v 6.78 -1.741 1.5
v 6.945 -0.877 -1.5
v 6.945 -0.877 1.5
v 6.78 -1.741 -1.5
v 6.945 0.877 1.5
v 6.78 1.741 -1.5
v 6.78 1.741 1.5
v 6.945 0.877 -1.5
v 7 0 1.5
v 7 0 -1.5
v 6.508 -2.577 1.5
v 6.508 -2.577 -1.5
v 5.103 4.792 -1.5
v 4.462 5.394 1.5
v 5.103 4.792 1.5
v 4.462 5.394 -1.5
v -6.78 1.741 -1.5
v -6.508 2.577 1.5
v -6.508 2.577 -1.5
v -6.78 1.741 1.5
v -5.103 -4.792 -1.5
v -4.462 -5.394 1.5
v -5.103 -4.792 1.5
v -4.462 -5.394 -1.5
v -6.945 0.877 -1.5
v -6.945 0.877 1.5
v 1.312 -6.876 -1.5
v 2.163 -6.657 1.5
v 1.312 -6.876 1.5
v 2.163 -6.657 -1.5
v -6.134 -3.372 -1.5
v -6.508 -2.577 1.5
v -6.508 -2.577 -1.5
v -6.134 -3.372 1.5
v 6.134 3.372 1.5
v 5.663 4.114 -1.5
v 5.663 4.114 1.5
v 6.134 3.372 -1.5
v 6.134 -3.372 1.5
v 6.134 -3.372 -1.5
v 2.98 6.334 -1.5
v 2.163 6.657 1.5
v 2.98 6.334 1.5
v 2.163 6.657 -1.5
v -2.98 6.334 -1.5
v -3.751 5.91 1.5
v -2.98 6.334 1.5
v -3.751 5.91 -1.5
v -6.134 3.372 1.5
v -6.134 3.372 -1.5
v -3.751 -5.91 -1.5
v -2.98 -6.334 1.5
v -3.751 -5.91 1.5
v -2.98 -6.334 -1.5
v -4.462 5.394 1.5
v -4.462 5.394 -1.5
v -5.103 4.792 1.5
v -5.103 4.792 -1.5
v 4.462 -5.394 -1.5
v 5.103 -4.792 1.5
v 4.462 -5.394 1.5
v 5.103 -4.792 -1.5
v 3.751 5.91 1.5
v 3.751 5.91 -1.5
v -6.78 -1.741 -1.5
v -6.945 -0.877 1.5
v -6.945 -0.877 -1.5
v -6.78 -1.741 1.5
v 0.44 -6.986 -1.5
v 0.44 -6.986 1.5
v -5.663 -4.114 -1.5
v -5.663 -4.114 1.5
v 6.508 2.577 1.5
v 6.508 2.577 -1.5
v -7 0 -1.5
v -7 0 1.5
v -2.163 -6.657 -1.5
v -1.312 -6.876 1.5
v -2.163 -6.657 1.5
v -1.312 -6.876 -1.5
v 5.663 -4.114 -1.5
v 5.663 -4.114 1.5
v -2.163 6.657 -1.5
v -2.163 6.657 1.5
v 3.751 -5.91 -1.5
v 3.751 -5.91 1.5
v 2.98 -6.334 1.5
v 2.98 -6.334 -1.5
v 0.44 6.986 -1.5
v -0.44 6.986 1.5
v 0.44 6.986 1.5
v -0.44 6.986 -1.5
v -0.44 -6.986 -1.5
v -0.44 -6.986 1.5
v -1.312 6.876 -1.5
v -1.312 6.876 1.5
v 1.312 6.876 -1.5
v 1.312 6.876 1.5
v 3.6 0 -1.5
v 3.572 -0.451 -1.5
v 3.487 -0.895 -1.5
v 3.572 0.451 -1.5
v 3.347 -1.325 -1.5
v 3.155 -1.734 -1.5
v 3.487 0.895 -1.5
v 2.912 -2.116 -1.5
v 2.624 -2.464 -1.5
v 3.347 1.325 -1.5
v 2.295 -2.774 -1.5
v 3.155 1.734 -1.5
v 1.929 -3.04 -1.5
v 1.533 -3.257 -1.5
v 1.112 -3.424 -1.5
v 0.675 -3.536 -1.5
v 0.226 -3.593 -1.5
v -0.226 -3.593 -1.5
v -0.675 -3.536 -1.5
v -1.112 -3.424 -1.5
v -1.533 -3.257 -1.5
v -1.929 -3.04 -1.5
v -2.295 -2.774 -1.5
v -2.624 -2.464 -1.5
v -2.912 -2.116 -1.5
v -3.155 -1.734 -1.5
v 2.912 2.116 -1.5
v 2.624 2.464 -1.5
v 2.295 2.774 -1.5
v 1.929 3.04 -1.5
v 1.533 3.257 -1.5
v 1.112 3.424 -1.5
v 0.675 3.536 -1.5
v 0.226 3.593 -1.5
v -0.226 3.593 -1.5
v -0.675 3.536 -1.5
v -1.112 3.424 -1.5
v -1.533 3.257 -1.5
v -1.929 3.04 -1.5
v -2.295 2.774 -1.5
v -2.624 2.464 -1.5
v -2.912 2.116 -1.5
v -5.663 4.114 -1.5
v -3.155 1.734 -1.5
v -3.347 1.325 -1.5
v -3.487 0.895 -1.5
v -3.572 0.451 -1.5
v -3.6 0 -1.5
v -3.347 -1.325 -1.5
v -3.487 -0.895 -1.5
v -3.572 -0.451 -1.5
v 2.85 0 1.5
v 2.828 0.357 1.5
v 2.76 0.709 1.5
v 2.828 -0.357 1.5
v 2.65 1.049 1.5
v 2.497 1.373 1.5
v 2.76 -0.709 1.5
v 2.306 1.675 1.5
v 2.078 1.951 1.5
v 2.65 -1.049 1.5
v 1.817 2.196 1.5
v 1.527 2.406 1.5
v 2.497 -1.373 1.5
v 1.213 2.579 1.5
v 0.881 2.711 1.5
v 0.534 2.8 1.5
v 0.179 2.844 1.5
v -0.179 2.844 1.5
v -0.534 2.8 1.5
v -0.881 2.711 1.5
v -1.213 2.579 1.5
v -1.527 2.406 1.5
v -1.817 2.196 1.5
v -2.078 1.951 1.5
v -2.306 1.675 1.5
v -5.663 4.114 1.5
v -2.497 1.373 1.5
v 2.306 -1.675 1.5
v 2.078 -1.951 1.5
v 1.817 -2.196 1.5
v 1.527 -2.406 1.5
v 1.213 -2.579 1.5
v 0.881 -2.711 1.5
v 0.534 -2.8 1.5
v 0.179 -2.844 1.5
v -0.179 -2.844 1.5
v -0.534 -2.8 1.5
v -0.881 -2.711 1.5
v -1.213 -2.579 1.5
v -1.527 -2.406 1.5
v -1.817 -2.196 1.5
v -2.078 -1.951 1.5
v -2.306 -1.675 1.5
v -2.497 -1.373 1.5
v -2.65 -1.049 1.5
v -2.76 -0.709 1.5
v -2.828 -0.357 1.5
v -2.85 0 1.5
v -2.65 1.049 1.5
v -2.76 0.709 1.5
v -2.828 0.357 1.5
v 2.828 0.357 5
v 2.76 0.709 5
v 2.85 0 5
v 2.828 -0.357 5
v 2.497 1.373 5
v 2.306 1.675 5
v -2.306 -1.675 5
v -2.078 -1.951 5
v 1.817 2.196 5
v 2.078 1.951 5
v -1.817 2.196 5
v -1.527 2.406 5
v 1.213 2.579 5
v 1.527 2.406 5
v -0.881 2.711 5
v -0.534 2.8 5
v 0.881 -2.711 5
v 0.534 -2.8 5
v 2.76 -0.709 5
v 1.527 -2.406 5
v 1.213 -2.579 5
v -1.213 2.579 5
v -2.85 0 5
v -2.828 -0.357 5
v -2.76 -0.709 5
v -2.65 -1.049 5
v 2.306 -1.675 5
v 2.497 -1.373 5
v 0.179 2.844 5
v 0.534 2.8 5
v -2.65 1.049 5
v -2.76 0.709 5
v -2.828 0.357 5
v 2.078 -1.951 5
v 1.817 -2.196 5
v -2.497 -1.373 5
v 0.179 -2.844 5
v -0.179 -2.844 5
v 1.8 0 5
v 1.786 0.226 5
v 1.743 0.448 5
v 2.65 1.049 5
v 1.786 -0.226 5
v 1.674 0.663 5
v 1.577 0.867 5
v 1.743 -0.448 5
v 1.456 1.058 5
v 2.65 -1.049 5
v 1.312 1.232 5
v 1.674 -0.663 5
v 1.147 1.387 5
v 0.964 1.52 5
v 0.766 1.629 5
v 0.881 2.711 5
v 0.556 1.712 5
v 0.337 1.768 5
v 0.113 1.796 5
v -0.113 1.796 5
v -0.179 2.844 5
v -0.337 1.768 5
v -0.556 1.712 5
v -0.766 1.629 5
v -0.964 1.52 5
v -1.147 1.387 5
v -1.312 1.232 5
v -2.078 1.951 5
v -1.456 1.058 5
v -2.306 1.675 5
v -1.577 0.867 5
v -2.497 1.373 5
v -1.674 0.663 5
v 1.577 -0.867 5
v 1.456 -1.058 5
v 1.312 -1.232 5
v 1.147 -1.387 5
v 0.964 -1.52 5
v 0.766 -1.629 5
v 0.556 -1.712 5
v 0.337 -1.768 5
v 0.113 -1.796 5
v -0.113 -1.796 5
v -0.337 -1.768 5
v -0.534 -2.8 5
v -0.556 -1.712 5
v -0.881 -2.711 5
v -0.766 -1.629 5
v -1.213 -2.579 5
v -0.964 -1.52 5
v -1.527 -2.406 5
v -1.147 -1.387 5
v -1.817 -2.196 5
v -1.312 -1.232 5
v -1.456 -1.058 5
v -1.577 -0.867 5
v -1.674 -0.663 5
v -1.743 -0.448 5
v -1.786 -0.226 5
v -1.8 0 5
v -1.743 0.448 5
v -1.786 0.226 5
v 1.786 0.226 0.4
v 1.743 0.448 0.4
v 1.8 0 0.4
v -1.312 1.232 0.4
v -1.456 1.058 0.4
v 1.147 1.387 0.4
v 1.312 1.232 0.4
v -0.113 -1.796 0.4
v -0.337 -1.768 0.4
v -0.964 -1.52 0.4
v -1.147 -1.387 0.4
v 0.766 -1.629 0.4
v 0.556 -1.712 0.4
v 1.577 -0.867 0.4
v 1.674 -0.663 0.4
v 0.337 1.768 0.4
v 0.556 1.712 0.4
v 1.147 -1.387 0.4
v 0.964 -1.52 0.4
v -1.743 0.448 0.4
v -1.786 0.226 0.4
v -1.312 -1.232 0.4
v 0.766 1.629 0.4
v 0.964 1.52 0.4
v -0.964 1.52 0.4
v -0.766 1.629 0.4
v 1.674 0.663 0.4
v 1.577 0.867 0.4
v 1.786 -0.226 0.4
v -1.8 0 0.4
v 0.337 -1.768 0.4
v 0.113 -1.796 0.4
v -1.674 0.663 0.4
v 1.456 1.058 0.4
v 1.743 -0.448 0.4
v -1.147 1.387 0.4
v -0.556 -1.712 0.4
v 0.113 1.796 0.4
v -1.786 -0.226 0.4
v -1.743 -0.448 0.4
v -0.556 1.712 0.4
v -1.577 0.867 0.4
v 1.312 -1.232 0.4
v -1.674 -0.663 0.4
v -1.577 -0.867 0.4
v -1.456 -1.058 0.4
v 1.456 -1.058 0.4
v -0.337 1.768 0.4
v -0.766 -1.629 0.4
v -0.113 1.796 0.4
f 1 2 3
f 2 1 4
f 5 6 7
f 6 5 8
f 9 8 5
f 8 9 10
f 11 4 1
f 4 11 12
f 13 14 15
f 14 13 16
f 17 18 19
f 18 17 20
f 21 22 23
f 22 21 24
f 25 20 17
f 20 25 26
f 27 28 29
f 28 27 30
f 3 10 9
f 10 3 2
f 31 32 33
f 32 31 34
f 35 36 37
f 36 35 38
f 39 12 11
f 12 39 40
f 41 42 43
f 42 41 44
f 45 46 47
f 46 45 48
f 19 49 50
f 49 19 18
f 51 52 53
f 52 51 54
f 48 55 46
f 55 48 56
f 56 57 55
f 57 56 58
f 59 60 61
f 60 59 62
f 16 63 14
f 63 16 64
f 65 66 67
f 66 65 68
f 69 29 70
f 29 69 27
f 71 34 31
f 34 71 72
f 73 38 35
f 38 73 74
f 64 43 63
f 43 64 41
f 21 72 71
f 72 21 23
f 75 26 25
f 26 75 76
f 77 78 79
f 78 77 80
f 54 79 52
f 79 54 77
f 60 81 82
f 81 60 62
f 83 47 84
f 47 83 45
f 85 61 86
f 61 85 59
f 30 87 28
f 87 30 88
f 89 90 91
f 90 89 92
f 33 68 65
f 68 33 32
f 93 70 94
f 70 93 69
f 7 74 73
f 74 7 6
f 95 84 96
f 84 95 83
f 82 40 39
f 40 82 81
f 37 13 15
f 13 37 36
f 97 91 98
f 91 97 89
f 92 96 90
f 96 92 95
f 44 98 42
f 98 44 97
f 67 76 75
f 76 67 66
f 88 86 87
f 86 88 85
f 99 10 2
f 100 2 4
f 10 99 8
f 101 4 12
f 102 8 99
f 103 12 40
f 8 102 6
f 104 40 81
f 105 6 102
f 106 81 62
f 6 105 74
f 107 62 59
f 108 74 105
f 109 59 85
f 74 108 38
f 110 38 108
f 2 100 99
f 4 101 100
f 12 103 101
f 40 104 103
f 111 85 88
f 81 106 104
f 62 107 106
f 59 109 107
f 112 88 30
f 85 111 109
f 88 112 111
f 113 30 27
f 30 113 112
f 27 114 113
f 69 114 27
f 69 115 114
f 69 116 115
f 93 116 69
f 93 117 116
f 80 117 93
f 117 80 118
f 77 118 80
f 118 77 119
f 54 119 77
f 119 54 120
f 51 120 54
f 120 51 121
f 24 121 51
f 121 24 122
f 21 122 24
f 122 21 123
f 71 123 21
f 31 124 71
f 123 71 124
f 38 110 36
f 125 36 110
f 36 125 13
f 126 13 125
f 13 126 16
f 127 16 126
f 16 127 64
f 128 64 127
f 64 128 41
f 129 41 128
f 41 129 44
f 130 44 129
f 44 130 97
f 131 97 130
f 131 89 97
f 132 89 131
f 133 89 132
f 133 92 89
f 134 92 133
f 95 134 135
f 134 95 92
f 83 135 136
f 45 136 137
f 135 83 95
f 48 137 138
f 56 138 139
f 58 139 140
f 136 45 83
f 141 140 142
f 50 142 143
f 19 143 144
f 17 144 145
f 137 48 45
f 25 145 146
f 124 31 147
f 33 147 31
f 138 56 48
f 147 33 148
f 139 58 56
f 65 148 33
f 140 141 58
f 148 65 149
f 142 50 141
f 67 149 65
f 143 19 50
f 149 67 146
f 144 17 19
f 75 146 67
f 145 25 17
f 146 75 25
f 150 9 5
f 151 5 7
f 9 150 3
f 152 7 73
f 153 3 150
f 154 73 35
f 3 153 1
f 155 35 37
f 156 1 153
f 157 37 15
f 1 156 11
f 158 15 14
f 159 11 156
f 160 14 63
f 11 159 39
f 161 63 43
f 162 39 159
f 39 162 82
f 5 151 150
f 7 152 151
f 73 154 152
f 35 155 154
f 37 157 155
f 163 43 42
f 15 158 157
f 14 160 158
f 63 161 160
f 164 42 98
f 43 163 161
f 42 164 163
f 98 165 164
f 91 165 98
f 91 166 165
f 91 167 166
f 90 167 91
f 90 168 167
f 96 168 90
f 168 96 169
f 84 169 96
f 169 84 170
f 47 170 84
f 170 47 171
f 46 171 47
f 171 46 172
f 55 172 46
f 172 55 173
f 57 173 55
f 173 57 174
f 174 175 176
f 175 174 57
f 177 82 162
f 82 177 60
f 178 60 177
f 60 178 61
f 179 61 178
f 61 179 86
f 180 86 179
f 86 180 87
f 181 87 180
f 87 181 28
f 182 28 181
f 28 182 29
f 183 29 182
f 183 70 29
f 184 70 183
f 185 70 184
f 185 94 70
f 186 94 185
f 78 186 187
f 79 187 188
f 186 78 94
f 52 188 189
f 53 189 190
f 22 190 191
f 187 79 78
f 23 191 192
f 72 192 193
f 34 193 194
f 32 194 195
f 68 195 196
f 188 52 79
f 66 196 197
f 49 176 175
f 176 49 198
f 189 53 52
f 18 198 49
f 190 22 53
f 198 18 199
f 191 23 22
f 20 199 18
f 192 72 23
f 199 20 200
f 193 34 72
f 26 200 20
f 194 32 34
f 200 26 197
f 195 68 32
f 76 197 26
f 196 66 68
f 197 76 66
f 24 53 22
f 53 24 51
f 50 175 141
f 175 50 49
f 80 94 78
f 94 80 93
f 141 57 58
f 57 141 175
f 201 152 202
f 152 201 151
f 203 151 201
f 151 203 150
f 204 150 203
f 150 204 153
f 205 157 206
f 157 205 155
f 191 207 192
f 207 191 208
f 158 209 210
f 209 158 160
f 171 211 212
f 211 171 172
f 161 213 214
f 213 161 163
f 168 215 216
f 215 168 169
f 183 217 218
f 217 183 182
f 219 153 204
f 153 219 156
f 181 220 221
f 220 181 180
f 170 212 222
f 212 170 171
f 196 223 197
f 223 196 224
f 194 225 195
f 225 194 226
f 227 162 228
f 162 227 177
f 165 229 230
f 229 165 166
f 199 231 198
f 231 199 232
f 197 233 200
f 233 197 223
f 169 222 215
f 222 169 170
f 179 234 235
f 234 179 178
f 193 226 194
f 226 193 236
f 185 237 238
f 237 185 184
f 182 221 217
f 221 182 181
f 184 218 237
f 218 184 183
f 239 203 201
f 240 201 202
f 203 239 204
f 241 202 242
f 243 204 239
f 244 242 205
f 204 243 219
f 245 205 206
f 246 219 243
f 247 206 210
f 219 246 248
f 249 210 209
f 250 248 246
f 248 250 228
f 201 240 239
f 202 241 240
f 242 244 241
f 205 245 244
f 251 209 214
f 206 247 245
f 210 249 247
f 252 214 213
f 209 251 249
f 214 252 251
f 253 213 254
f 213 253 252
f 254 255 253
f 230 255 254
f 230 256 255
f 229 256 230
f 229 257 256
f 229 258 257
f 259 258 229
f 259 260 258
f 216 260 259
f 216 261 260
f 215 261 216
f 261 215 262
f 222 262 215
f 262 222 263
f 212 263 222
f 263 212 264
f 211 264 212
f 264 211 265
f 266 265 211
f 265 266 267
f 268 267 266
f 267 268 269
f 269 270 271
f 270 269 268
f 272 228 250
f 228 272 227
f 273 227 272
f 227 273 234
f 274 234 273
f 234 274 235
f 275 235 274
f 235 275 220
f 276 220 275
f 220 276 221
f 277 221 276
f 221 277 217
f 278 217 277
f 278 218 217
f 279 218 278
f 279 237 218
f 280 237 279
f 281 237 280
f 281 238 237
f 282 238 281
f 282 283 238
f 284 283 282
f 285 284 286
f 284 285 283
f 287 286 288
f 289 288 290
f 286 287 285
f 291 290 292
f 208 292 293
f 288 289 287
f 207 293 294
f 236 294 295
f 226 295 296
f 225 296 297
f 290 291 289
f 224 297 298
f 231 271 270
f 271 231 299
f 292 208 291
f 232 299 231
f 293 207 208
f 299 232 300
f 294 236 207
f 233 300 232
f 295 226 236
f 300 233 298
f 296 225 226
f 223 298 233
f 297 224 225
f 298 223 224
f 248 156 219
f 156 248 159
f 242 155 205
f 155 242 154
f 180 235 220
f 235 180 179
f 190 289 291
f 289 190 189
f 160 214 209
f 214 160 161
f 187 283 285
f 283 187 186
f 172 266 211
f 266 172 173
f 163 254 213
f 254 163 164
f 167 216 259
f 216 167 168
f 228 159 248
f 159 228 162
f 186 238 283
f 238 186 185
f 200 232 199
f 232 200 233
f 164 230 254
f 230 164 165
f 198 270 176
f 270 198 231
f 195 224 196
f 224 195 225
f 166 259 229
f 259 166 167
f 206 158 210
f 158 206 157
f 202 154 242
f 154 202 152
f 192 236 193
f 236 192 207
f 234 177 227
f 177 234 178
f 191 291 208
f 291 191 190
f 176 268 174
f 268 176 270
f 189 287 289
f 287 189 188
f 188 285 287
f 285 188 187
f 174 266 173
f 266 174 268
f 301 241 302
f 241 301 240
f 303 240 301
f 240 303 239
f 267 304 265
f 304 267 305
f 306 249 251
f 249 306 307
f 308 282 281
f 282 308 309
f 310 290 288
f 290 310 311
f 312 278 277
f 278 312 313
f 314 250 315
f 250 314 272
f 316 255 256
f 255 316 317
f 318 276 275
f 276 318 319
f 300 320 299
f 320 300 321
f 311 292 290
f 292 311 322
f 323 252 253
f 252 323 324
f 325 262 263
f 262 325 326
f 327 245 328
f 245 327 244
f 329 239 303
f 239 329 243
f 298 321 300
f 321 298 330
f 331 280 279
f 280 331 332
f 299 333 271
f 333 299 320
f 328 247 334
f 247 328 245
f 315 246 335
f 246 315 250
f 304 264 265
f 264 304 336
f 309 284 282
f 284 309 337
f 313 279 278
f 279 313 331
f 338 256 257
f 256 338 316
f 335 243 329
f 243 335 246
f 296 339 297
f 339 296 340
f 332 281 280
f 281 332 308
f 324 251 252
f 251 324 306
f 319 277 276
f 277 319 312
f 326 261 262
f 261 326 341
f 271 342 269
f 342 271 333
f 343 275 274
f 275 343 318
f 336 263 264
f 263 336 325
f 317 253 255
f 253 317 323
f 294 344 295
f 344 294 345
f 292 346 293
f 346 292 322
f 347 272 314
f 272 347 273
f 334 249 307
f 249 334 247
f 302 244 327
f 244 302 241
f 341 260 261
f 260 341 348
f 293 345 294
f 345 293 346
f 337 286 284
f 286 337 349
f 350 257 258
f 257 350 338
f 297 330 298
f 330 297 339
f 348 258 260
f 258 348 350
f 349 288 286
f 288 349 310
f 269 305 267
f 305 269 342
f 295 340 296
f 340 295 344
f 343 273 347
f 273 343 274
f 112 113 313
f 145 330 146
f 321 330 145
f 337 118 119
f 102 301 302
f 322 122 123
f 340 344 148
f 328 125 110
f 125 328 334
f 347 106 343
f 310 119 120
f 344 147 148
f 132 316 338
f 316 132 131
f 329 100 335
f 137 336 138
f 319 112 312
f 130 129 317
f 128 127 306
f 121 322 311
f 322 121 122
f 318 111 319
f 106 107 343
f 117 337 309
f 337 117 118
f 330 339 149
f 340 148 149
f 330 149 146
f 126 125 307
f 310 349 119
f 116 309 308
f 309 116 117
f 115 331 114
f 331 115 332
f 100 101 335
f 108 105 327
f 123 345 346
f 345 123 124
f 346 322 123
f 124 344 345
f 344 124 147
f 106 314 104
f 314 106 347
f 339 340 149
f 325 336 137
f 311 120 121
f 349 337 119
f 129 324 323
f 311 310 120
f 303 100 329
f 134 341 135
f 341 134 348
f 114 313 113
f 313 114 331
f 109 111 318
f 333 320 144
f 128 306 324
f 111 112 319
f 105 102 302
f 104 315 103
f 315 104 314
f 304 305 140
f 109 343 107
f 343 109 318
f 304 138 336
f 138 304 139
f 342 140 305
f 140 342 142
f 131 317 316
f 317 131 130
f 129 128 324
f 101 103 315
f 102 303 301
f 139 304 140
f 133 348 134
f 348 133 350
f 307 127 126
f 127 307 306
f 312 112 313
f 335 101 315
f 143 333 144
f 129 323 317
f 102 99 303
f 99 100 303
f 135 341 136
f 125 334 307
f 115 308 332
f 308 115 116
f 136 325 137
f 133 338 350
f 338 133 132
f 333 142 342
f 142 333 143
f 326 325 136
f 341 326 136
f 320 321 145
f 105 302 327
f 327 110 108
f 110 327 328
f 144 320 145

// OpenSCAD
$fn = 50;


difference() {
	union() {
		translate(v = [0, 0, -1.5000000000]) {
			rotate(a = [0, 0, 0]) {
				cylinder(h = 3, r = 7.0000000000);
			}
		}
		translate(v = [0, 0, -1.5000000000]) {
			rotate(a = [0, 0, 0]) {
				cylinder(h = 6.5000000000, r = 2.8500000000);
			}
		}
	}
	union() {
		translate(v = [0, 0, -125.0000000000]) {
			rotate(a = [0, 0, 0]) {
				cylinder(h = 250, r = 1.8000000000);
			}
		}
		#translate(v = [0, 0, 0.4000000000]) {
			rotate(a = [0, 180, 0]) {
				cylinder(h = 1.9000000000, r1 = 1.8000000000, r2 = 3.6000000000);
			}
		}
		#translate(v = [0, 0, 5.0000000000]) {
			rotate(a = [0, 180, 0]) {
				cylinder(h = 6.5000000000, r = 1.8000000000);
			}
		}
	}
}
